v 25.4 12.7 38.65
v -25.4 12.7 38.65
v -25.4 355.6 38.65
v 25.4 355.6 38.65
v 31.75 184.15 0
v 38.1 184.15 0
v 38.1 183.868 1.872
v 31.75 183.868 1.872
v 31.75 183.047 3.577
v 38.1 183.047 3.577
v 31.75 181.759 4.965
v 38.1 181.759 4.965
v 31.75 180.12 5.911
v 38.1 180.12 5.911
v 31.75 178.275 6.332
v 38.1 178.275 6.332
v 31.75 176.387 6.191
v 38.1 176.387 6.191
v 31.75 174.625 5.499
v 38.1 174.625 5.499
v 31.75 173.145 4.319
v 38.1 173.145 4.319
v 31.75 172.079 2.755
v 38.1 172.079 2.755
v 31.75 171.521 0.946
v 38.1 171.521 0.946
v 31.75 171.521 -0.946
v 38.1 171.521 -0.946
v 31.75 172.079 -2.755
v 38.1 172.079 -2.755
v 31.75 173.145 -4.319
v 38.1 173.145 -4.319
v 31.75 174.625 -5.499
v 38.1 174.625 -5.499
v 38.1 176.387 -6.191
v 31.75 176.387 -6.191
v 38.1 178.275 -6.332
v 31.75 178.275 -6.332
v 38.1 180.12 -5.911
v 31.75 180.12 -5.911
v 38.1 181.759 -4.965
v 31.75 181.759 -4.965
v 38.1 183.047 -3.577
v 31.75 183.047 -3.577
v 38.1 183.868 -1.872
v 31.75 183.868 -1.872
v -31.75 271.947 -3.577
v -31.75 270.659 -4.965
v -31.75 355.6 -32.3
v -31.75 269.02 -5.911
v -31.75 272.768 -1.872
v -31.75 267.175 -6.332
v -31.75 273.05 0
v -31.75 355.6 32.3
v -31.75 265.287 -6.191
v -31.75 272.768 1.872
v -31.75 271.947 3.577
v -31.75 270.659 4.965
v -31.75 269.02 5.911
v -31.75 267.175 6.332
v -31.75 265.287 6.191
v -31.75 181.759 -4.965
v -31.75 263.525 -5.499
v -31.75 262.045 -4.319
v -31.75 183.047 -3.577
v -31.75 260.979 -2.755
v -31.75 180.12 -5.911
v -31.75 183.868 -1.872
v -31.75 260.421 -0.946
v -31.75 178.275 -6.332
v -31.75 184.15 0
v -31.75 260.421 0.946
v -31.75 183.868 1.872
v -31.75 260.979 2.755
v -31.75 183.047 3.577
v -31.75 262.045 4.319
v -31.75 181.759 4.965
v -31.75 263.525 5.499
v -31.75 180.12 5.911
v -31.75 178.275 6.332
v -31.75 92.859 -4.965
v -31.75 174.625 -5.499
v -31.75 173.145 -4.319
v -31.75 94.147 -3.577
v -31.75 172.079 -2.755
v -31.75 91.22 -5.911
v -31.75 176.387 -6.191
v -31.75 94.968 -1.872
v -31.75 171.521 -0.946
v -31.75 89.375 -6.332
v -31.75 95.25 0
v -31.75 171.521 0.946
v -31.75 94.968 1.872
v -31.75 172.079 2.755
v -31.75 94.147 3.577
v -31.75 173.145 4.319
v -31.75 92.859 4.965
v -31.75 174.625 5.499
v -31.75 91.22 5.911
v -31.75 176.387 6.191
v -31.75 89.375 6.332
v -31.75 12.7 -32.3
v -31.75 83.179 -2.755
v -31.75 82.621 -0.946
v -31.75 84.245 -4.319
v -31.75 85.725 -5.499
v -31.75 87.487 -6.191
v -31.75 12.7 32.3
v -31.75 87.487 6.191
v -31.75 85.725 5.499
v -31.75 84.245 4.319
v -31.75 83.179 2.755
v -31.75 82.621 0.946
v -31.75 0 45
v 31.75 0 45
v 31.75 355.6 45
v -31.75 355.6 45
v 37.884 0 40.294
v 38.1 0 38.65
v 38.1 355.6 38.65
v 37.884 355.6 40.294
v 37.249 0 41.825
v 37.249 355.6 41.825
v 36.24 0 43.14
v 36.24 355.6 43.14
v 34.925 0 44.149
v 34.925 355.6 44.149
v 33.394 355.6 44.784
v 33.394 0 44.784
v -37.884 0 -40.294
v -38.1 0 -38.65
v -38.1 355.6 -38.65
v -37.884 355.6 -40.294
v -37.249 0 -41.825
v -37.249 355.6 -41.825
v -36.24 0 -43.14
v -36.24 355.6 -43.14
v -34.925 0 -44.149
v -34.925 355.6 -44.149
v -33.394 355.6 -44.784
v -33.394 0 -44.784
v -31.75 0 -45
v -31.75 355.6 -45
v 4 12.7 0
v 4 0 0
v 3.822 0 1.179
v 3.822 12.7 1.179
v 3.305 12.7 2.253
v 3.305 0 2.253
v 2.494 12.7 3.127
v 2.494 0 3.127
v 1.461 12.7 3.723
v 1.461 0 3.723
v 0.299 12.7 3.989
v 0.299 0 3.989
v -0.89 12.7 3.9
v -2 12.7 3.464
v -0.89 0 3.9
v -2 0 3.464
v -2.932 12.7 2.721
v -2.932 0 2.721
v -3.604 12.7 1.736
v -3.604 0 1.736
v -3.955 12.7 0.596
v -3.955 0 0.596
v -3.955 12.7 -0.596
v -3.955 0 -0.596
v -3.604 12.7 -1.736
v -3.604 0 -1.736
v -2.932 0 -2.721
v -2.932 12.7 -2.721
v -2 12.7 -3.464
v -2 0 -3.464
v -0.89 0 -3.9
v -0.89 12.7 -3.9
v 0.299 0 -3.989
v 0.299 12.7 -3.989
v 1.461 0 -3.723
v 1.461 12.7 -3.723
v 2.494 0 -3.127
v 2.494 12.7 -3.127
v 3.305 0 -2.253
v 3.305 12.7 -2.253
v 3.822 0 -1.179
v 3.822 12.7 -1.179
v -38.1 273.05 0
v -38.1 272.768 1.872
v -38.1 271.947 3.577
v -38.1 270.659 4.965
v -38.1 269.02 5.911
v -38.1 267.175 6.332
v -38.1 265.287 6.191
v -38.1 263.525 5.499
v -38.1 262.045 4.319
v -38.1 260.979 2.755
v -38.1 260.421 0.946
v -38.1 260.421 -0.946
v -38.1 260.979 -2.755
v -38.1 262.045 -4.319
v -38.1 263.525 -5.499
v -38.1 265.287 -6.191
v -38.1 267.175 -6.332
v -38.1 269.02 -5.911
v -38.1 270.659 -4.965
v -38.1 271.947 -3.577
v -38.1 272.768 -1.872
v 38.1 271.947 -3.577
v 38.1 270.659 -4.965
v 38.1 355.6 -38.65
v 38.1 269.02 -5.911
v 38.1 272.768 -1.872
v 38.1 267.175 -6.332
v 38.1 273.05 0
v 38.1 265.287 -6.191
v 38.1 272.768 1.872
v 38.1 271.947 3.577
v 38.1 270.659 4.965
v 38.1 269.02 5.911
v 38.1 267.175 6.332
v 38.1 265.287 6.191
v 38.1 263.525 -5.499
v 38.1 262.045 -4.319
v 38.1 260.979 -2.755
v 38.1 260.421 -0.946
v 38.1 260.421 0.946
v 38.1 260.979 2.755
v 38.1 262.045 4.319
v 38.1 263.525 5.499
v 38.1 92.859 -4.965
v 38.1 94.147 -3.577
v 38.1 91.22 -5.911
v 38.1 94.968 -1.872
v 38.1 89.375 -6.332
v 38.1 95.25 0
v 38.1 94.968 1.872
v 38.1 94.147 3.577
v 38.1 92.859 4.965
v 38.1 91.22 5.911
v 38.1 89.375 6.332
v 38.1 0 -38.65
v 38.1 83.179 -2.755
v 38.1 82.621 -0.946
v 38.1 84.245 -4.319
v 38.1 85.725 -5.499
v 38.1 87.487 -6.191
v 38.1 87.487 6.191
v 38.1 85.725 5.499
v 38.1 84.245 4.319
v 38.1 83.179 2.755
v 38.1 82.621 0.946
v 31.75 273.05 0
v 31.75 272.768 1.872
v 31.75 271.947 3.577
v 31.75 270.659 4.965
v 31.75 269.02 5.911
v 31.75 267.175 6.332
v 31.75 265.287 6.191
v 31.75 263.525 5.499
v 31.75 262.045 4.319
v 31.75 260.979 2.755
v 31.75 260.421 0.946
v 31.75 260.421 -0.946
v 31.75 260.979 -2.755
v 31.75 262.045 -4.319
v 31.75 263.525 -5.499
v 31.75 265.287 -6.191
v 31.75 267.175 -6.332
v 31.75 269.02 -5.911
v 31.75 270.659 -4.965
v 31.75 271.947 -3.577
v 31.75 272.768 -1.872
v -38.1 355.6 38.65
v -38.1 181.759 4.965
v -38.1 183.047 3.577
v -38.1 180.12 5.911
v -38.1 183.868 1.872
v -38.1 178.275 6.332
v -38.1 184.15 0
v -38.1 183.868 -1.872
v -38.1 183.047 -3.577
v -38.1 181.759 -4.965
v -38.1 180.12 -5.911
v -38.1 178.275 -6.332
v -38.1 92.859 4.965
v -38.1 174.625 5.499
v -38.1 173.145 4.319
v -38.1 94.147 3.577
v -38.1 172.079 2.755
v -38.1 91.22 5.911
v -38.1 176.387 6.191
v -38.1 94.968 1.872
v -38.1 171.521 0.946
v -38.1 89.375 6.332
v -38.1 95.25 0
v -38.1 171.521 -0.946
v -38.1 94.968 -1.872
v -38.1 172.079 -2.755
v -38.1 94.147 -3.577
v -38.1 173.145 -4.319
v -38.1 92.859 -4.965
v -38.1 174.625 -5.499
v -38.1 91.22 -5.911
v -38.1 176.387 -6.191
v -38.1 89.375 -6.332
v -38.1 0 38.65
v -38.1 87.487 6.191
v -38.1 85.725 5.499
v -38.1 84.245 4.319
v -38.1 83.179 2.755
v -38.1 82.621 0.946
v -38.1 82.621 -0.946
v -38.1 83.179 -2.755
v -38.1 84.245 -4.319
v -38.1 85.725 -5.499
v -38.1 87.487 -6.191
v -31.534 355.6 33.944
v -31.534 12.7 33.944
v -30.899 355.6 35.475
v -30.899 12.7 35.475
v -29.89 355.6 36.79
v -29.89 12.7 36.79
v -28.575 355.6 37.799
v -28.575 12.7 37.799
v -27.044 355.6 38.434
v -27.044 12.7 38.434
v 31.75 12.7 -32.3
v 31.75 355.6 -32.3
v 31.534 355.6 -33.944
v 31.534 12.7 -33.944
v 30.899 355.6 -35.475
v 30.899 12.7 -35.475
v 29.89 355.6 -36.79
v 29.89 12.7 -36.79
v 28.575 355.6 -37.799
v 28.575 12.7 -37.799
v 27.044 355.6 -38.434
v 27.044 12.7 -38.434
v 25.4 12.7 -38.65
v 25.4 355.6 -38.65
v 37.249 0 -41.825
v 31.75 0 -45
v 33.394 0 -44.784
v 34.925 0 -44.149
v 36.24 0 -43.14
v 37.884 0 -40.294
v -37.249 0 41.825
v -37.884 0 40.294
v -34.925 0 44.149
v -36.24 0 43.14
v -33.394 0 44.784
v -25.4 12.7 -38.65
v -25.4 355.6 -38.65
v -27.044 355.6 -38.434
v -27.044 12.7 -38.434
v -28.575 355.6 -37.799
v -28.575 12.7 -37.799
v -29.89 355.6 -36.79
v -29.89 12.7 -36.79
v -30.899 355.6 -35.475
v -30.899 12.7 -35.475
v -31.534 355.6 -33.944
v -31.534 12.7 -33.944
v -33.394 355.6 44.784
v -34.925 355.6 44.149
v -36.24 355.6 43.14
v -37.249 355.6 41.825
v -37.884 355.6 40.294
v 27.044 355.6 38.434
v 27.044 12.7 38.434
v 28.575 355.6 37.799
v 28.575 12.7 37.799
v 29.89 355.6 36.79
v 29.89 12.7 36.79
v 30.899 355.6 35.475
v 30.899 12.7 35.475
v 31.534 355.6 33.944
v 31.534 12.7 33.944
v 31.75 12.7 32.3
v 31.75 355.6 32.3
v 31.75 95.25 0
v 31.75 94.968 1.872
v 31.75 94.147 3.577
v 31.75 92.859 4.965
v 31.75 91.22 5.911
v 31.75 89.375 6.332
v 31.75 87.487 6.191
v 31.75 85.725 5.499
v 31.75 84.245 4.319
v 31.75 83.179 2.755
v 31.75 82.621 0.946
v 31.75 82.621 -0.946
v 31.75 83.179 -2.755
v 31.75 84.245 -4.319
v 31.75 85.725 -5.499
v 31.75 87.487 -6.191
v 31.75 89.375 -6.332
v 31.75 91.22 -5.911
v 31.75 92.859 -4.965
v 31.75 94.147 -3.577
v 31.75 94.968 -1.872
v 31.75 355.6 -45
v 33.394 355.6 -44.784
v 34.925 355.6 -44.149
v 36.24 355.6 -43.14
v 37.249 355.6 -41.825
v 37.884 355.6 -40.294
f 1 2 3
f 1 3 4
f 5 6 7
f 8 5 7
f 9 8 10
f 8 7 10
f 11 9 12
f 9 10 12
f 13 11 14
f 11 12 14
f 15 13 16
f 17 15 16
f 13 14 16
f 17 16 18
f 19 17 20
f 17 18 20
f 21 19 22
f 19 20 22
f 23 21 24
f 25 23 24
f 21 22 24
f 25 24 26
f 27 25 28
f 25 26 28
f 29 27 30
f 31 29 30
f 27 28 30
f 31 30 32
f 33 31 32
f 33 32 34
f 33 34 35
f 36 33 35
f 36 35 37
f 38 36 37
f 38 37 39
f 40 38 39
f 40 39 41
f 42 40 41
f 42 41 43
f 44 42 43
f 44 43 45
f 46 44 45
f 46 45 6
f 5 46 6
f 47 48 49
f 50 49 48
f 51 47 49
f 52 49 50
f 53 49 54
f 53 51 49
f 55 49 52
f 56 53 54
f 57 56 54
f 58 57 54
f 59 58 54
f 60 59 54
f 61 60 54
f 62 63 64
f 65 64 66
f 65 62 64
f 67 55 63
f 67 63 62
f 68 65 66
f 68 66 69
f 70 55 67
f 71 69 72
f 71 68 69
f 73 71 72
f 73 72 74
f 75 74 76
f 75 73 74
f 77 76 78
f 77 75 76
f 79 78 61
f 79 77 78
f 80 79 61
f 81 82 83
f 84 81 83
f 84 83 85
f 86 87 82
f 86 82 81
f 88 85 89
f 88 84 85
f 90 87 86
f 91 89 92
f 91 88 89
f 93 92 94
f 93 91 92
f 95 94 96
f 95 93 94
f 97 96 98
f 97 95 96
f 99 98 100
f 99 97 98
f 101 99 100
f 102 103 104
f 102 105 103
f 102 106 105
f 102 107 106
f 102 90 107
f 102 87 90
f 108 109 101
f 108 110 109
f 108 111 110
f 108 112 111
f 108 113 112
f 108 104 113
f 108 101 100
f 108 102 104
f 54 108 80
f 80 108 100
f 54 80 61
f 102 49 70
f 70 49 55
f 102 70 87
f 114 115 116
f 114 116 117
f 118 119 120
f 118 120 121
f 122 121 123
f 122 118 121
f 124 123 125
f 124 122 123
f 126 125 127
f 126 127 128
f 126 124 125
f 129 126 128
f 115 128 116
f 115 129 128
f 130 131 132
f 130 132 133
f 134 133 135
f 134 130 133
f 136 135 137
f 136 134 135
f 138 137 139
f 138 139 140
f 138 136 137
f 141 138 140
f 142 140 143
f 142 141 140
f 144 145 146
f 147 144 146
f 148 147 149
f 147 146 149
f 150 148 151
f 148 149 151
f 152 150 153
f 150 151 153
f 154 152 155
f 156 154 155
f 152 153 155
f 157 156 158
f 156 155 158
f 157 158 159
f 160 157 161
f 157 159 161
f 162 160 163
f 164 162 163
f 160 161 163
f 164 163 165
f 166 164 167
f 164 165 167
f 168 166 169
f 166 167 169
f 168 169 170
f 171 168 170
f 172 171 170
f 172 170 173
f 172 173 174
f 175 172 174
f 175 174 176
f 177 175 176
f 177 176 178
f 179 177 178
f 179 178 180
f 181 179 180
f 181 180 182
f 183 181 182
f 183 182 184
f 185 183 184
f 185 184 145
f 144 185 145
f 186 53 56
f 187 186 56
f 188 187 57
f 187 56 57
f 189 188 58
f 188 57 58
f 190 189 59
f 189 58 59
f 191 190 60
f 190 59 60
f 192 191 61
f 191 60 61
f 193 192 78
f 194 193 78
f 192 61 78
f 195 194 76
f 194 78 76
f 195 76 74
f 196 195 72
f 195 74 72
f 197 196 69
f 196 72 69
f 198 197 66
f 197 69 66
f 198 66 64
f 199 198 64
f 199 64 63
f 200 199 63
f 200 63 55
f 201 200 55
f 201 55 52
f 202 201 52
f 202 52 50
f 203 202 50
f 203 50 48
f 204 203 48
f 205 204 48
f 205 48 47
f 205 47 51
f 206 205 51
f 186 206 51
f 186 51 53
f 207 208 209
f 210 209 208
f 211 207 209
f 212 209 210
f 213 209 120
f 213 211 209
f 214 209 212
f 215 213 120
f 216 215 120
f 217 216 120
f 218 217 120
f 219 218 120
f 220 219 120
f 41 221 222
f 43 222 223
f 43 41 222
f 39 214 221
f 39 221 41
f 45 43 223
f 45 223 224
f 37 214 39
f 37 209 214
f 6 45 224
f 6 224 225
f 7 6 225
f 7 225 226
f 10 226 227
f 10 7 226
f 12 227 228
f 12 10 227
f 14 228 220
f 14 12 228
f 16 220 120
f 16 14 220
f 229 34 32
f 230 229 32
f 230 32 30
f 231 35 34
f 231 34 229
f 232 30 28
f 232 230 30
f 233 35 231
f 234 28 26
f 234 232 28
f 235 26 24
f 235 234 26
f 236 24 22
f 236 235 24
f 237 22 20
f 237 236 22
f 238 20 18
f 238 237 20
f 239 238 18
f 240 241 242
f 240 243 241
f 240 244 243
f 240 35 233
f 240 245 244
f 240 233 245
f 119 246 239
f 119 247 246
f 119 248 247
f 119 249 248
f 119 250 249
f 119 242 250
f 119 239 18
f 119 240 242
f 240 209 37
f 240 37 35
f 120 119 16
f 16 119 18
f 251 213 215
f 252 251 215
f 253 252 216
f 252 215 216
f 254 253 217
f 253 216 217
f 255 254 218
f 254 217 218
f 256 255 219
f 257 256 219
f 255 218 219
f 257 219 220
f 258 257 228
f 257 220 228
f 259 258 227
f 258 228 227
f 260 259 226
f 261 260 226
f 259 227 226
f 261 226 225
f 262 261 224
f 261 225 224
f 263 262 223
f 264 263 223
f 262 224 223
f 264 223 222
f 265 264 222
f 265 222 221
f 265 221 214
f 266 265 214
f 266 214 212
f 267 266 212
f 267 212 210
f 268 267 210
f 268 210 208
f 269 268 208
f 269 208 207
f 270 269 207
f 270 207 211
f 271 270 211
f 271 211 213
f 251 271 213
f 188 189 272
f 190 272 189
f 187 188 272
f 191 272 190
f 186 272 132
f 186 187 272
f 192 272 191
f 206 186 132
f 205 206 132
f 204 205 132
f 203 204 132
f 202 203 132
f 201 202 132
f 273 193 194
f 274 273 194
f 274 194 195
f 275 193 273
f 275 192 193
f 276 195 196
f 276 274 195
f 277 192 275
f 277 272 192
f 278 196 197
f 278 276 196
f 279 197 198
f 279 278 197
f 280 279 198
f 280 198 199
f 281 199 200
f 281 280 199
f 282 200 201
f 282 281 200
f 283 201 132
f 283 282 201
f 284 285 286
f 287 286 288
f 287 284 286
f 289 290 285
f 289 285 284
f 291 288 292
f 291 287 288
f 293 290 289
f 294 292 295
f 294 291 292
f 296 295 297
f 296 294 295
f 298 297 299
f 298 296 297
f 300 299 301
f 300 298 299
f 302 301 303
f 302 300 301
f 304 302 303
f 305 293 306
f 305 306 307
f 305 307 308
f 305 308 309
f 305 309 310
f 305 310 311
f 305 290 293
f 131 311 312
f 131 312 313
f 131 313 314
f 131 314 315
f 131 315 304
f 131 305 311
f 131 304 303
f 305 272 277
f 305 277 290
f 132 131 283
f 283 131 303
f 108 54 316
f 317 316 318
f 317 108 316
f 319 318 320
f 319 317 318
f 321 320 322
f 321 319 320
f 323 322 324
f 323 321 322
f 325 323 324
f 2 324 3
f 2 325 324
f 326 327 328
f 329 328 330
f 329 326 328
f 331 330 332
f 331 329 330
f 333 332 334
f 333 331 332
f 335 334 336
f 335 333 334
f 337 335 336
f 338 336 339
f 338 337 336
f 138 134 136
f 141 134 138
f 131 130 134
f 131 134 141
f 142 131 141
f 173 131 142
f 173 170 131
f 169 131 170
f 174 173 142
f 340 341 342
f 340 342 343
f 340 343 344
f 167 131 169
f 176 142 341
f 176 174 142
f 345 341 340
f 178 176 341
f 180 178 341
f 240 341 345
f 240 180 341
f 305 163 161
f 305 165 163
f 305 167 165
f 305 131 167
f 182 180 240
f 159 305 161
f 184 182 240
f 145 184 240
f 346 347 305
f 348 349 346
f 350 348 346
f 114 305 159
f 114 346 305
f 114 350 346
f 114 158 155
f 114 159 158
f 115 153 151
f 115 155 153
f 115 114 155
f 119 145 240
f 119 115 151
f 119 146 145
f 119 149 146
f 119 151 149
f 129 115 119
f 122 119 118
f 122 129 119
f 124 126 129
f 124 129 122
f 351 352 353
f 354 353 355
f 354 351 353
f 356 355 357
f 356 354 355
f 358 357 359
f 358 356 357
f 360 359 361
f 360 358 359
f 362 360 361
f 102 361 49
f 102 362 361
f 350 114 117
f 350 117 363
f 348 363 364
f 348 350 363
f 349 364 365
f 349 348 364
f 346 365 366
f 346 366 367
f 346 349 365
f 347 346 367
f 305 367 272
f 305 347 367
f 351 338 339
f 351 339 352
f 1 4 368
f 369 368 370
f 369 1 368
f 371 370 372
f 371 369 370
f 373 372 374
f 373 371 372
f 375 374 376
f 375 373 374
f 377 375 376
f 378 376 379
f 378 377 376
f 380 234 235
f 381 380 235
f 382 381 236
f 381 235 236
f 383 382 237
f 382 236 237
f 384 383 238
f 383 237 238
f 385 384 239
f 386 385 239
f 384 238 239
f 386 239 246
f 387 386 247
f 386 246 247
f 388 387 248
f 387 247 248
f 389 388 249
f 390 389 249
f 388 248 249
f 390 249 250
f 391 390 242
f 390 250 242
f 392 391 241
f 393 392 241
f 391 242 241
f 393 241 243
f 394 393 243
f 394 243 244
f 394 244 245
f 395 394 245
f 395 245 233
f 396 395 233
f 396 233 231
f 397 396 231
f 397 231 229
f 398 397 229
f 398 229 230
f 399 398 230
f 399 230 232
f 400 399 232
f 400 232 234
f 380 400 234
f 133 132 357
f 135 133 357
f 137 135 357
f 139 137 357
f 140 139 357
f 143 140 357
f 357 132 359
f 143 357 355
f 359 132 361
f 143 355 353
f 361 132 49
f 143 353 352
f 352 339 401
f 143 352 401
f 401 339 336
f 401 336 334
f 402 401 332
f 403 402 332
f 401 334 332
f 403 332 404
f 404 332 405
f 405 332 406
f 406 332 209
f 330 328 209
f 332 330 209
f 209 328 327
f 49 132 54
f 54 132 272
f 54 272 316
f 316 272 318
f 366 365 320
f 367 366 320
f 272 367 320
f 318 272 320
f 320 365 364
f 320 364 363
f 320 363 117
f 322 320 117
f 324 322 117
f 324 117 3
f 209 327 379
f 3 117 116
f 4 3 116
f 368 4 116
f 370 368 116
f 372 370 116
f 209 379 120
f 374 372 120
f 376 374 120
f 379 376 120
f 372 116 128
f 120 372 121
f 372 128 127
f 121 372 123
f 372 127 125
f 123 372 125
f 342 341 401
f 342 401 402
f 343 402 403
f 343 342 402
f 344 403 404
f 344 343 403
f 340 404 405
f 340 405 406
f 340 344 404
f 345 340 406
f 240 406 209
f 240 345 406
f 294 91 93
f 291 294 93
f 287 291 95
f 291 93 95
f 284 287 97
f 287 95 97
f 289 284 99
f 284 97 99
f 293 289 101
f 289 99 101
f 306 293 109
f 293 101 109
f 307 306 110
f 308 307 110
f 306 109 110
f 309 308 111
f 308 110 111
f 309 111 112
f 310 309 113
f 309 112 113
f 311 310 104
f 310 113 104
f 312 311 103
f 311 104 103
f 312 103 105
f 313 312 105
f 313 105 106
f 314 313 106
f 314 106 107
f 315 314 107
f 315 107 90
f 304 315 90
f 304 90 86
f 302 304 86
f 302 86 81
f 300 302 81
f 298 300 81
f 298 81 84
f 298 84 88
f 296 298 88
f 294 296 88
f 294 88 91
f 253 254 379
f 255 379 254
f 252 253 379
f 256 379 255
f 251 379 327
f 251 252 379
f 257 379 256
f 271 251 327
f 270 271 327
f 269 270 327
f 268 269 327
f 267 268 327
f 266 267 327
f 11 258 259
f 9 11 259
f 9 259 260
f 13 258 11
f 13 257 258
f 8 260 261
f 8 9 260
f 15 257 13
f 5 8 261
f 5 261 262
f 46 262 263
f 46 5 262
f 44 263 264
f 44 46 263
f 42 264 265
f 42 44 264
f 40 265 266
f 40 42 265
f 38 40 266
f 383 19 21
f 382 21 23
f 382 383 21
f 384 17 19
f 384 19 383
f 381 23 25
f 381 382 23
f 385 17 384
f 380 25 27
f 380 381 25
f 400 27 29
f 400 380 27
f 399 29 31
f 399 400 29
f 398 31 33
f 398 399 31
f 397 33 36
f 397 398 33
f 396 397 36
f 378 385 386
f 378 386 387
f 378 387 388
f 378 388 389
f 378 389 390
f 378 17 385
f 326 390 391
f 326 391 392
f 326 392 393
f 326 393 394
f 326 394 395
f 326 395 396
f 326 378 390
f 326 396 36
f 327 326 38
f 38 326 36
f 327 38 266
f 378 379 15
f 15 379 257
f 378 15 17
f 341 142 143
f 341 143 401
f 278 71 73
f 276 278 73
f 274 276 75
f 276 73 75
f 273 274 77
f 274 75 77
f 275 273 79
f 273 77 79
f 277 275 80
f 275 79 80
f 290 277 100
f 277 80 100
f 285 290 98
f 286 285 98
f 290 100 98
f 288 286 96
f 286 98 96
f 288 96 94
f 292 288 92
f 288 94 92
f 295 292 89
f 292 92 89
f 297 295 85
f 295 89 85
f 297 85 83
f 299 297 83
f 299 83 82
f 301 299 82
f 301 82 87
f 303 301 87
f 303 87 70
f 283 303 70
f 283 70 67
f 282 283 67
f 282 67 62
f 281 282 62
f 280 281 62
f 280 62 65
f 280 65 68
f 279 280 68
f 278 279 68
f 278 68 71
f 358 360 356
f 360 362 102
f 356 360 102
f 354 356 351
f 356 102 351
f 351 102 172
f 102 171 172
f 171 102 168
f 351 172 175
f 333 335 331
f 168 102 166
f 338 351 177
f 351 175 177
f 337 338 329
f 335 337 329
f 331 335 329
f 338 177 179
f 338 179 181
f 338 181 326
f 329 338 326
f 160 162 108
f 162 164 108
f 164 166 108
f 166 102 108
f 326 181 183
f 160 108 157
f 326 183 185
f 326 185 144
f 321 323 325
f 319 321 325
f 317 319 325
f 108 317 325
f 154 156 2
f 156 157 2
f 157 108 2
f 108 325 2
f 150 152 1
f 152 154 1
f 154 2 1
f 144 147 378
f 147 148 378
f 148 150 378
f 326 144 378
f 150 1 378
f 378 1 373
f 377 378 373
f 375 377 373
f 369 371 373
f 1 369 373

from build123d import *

# Parameters (mm, degrees)
F0_R     = 4
F1_DEPTH = 6.35
F2_DEPTH = 355.6
F4_DEPTH = 12.7
F5_R     = 6.35
F6_DEPTH = 76.201


# Not quite as in the source:
# - a feature names something its author has since deleted; it is built from what else it names


with BuildPart() as f1:
    # F0 (on Front) → F1 (new body)
    with BuildSketch(Plane.XZ):
        with BuildLine():
            Line((-25.4, -38.65), (25.4, -38.65))
            ThreePointArc((25.4, -38.65), (29.8901280605, -36.7901280605), (31.75, -32.3))
            Line((31.75, -32.3), (31.75, 32.3))
            ThreePointArc((31.75, 32.3), (29.8901280605, 36.7901280605), (25.4, 38.65))
            Line((25.4, 38.65), (-25.4, 38.65))
            ThreePointArc((-25.4, 38.65), (-29.8901280605, 36.7901280605), (-31.75, 32.3))
            Line((-31.75, 32.3), (-31.75, -32.3))
            ThreePointArc((-31.75, -32.3), (-29.8901280605, -36.7901280605), (-25.4, -38.65))
        make_face()
        Circle(F0_R, mode=Mode.SUBTRACT)
    extrude(amount=-F1_DEPTH)

    # F0 (on Front) → F2 (join)
    with BuildSketch(Plane.XZ):
        with BuildLine():
            Line((-31.75, -45), (31.75, -45))
            ThreePointArc((31.75, -45), (36.2401280605, -43.1401280605), (38.1, -38.65))
            Line((38.1, -38.65), (38.1, 38.65))
            ThreePointArc((38.1, 38.65), (36.2401280605, 43.1401280605), (31.75, 45))
            Line((31.75, 45), (-31.75, 45))
            ThreePointArc((-31.75, 45), (-36.2401280605, 43.1401280605), (-38.1, 38.65))
            Line((-38.1, 38.65), (-38.1, -38.65))
            ThreePointArc((-38.1, -38.65), (-36.2401280605, -43.1401280605), (-31.75, -45))
        make_face()
        with BuildLine():
            ThreePointArc((31.75, -32.3), (29.8901280605, -36.7901280605), (25.4, -38.65))
            Line((25.4, -38.65), (-25.4, -38.65))
            ThreePointArc((-25.4, -38.65), (-29.8901280605, -36.7901280605), (-31.75, -32.3))
            Line((-31.75, -32.3), (-31.75, 32.3))
            ThreePointArc((-31.75, 32.3), (-29.8901280605, 36.7901280605), (-25.4, 38.65))
            Line((-25.4, 38.65), (25.4, 38.65))
            ThreePointArc((25.4, 38.65), (29.8901280605, 36.7901280605), (31.75, 32.3))
            Line((31.75, 32.3), (31.75, -32.3))
        make_face(mode=Mode.SUBTRACT)
    extrude(amount=-F2_DEPTH)

    # F0 (on Front) → F4 (join)
    with BuildSketch(Plane.XZ):
        with BuildLine():
            Line((-31.75, -45), (31.75, -45))
            ThreePointArc((31.75, -45), (36.2401280605, -43.1401280605), (38.1, -38.65))
            Line((38.1, -38.65), (38.1, 38.65))
            ThreePointArc((38.1, 38.65), (36.2401280605, 43.1401280605), (31.75, 45))
            Line((31.75, 45), (-31.75, 45))
            ThreePointArc((-31.75, 45), (-36.2401280605, 43.1401280605), (-38.1, 38.65))
            Line((-38.1, 38.65), (-38.1, -38.65))
            ThreePointArc((-38.1, -38.65), (-36.2401280605, -43.1401280605), (-31.75, -45))
        make_face()
        with BuildLine():
            ThreePointArc((31.75, -32.3), (29.8901280605, -36.7901280605), (25.4, -38.65))
            Line((25.4, -38.65), (-25.4, -38.65))
            ThreePointArc((-25.4, -38.65), (-29.8901280605, -36.7901280605), (-31.75, -32.3))
            Line((-31.75, -32.3), (-31.75, 32.3))
            ThreePointArc((-31.75, 32.3), (-29.8901280605, 36.7901280605), (-25.4, 38.65))
            Line((-25.4, 38.65), (25.4, 38.65))
            ThreePointArc((25.4, 38.65), (29.8901280605, 36.7901280605), (31.75, 32.3))
            Line((31.75, 32.3), (31.75, -32.3))
        make_face(mode=Mode.SUBTRACT)
        with BuildLine():
            Line((-25.4, -38.65), (25.4, -38.65))
            ThreePointArc((25.4, -38.65), (29.8901280605, -36.7901280605), (31.75, -32.3))
            Line((31.75, -32.3), (31.75, 32.3))
            ThreePointArc((31.75, 32.3), (29.8901280605, 36.7901280605), (25.4, 38.65))
            Line((25.4, 38.65), (-25.4, 38.65))
            ThreePointArc((-25.4, 38.65), (-29.8901280605, 36.7901280605), (-31.75, 32.3))
            Line((-31.75, 32.3), (-31.75, -32.3))
            ThreePointArc((-31.75, -32.3), (-29.8901280605, -36.7901280605), (-25.4, -38.65))
        make_face()
        Circle(F0_R, mode=Mode.SUBTRACT)
    extrude(amount=-F4_DEPTH)

    # F5 (on face) → F6 (cut, through all)
    with BuildSketch(Plane.YZ.offset(38.1)):
        with Locations((88.9, 0)):
            Circle(F5_R)
        with Locations((177.8, 0)):
            Circle(F5_R)
        with Locations((266.7, 0)):
            Circle(F5_R)
    extrude(amount=-F6_DEPTH, mode=Mode.SUBTRACT)


solid = f1.part
